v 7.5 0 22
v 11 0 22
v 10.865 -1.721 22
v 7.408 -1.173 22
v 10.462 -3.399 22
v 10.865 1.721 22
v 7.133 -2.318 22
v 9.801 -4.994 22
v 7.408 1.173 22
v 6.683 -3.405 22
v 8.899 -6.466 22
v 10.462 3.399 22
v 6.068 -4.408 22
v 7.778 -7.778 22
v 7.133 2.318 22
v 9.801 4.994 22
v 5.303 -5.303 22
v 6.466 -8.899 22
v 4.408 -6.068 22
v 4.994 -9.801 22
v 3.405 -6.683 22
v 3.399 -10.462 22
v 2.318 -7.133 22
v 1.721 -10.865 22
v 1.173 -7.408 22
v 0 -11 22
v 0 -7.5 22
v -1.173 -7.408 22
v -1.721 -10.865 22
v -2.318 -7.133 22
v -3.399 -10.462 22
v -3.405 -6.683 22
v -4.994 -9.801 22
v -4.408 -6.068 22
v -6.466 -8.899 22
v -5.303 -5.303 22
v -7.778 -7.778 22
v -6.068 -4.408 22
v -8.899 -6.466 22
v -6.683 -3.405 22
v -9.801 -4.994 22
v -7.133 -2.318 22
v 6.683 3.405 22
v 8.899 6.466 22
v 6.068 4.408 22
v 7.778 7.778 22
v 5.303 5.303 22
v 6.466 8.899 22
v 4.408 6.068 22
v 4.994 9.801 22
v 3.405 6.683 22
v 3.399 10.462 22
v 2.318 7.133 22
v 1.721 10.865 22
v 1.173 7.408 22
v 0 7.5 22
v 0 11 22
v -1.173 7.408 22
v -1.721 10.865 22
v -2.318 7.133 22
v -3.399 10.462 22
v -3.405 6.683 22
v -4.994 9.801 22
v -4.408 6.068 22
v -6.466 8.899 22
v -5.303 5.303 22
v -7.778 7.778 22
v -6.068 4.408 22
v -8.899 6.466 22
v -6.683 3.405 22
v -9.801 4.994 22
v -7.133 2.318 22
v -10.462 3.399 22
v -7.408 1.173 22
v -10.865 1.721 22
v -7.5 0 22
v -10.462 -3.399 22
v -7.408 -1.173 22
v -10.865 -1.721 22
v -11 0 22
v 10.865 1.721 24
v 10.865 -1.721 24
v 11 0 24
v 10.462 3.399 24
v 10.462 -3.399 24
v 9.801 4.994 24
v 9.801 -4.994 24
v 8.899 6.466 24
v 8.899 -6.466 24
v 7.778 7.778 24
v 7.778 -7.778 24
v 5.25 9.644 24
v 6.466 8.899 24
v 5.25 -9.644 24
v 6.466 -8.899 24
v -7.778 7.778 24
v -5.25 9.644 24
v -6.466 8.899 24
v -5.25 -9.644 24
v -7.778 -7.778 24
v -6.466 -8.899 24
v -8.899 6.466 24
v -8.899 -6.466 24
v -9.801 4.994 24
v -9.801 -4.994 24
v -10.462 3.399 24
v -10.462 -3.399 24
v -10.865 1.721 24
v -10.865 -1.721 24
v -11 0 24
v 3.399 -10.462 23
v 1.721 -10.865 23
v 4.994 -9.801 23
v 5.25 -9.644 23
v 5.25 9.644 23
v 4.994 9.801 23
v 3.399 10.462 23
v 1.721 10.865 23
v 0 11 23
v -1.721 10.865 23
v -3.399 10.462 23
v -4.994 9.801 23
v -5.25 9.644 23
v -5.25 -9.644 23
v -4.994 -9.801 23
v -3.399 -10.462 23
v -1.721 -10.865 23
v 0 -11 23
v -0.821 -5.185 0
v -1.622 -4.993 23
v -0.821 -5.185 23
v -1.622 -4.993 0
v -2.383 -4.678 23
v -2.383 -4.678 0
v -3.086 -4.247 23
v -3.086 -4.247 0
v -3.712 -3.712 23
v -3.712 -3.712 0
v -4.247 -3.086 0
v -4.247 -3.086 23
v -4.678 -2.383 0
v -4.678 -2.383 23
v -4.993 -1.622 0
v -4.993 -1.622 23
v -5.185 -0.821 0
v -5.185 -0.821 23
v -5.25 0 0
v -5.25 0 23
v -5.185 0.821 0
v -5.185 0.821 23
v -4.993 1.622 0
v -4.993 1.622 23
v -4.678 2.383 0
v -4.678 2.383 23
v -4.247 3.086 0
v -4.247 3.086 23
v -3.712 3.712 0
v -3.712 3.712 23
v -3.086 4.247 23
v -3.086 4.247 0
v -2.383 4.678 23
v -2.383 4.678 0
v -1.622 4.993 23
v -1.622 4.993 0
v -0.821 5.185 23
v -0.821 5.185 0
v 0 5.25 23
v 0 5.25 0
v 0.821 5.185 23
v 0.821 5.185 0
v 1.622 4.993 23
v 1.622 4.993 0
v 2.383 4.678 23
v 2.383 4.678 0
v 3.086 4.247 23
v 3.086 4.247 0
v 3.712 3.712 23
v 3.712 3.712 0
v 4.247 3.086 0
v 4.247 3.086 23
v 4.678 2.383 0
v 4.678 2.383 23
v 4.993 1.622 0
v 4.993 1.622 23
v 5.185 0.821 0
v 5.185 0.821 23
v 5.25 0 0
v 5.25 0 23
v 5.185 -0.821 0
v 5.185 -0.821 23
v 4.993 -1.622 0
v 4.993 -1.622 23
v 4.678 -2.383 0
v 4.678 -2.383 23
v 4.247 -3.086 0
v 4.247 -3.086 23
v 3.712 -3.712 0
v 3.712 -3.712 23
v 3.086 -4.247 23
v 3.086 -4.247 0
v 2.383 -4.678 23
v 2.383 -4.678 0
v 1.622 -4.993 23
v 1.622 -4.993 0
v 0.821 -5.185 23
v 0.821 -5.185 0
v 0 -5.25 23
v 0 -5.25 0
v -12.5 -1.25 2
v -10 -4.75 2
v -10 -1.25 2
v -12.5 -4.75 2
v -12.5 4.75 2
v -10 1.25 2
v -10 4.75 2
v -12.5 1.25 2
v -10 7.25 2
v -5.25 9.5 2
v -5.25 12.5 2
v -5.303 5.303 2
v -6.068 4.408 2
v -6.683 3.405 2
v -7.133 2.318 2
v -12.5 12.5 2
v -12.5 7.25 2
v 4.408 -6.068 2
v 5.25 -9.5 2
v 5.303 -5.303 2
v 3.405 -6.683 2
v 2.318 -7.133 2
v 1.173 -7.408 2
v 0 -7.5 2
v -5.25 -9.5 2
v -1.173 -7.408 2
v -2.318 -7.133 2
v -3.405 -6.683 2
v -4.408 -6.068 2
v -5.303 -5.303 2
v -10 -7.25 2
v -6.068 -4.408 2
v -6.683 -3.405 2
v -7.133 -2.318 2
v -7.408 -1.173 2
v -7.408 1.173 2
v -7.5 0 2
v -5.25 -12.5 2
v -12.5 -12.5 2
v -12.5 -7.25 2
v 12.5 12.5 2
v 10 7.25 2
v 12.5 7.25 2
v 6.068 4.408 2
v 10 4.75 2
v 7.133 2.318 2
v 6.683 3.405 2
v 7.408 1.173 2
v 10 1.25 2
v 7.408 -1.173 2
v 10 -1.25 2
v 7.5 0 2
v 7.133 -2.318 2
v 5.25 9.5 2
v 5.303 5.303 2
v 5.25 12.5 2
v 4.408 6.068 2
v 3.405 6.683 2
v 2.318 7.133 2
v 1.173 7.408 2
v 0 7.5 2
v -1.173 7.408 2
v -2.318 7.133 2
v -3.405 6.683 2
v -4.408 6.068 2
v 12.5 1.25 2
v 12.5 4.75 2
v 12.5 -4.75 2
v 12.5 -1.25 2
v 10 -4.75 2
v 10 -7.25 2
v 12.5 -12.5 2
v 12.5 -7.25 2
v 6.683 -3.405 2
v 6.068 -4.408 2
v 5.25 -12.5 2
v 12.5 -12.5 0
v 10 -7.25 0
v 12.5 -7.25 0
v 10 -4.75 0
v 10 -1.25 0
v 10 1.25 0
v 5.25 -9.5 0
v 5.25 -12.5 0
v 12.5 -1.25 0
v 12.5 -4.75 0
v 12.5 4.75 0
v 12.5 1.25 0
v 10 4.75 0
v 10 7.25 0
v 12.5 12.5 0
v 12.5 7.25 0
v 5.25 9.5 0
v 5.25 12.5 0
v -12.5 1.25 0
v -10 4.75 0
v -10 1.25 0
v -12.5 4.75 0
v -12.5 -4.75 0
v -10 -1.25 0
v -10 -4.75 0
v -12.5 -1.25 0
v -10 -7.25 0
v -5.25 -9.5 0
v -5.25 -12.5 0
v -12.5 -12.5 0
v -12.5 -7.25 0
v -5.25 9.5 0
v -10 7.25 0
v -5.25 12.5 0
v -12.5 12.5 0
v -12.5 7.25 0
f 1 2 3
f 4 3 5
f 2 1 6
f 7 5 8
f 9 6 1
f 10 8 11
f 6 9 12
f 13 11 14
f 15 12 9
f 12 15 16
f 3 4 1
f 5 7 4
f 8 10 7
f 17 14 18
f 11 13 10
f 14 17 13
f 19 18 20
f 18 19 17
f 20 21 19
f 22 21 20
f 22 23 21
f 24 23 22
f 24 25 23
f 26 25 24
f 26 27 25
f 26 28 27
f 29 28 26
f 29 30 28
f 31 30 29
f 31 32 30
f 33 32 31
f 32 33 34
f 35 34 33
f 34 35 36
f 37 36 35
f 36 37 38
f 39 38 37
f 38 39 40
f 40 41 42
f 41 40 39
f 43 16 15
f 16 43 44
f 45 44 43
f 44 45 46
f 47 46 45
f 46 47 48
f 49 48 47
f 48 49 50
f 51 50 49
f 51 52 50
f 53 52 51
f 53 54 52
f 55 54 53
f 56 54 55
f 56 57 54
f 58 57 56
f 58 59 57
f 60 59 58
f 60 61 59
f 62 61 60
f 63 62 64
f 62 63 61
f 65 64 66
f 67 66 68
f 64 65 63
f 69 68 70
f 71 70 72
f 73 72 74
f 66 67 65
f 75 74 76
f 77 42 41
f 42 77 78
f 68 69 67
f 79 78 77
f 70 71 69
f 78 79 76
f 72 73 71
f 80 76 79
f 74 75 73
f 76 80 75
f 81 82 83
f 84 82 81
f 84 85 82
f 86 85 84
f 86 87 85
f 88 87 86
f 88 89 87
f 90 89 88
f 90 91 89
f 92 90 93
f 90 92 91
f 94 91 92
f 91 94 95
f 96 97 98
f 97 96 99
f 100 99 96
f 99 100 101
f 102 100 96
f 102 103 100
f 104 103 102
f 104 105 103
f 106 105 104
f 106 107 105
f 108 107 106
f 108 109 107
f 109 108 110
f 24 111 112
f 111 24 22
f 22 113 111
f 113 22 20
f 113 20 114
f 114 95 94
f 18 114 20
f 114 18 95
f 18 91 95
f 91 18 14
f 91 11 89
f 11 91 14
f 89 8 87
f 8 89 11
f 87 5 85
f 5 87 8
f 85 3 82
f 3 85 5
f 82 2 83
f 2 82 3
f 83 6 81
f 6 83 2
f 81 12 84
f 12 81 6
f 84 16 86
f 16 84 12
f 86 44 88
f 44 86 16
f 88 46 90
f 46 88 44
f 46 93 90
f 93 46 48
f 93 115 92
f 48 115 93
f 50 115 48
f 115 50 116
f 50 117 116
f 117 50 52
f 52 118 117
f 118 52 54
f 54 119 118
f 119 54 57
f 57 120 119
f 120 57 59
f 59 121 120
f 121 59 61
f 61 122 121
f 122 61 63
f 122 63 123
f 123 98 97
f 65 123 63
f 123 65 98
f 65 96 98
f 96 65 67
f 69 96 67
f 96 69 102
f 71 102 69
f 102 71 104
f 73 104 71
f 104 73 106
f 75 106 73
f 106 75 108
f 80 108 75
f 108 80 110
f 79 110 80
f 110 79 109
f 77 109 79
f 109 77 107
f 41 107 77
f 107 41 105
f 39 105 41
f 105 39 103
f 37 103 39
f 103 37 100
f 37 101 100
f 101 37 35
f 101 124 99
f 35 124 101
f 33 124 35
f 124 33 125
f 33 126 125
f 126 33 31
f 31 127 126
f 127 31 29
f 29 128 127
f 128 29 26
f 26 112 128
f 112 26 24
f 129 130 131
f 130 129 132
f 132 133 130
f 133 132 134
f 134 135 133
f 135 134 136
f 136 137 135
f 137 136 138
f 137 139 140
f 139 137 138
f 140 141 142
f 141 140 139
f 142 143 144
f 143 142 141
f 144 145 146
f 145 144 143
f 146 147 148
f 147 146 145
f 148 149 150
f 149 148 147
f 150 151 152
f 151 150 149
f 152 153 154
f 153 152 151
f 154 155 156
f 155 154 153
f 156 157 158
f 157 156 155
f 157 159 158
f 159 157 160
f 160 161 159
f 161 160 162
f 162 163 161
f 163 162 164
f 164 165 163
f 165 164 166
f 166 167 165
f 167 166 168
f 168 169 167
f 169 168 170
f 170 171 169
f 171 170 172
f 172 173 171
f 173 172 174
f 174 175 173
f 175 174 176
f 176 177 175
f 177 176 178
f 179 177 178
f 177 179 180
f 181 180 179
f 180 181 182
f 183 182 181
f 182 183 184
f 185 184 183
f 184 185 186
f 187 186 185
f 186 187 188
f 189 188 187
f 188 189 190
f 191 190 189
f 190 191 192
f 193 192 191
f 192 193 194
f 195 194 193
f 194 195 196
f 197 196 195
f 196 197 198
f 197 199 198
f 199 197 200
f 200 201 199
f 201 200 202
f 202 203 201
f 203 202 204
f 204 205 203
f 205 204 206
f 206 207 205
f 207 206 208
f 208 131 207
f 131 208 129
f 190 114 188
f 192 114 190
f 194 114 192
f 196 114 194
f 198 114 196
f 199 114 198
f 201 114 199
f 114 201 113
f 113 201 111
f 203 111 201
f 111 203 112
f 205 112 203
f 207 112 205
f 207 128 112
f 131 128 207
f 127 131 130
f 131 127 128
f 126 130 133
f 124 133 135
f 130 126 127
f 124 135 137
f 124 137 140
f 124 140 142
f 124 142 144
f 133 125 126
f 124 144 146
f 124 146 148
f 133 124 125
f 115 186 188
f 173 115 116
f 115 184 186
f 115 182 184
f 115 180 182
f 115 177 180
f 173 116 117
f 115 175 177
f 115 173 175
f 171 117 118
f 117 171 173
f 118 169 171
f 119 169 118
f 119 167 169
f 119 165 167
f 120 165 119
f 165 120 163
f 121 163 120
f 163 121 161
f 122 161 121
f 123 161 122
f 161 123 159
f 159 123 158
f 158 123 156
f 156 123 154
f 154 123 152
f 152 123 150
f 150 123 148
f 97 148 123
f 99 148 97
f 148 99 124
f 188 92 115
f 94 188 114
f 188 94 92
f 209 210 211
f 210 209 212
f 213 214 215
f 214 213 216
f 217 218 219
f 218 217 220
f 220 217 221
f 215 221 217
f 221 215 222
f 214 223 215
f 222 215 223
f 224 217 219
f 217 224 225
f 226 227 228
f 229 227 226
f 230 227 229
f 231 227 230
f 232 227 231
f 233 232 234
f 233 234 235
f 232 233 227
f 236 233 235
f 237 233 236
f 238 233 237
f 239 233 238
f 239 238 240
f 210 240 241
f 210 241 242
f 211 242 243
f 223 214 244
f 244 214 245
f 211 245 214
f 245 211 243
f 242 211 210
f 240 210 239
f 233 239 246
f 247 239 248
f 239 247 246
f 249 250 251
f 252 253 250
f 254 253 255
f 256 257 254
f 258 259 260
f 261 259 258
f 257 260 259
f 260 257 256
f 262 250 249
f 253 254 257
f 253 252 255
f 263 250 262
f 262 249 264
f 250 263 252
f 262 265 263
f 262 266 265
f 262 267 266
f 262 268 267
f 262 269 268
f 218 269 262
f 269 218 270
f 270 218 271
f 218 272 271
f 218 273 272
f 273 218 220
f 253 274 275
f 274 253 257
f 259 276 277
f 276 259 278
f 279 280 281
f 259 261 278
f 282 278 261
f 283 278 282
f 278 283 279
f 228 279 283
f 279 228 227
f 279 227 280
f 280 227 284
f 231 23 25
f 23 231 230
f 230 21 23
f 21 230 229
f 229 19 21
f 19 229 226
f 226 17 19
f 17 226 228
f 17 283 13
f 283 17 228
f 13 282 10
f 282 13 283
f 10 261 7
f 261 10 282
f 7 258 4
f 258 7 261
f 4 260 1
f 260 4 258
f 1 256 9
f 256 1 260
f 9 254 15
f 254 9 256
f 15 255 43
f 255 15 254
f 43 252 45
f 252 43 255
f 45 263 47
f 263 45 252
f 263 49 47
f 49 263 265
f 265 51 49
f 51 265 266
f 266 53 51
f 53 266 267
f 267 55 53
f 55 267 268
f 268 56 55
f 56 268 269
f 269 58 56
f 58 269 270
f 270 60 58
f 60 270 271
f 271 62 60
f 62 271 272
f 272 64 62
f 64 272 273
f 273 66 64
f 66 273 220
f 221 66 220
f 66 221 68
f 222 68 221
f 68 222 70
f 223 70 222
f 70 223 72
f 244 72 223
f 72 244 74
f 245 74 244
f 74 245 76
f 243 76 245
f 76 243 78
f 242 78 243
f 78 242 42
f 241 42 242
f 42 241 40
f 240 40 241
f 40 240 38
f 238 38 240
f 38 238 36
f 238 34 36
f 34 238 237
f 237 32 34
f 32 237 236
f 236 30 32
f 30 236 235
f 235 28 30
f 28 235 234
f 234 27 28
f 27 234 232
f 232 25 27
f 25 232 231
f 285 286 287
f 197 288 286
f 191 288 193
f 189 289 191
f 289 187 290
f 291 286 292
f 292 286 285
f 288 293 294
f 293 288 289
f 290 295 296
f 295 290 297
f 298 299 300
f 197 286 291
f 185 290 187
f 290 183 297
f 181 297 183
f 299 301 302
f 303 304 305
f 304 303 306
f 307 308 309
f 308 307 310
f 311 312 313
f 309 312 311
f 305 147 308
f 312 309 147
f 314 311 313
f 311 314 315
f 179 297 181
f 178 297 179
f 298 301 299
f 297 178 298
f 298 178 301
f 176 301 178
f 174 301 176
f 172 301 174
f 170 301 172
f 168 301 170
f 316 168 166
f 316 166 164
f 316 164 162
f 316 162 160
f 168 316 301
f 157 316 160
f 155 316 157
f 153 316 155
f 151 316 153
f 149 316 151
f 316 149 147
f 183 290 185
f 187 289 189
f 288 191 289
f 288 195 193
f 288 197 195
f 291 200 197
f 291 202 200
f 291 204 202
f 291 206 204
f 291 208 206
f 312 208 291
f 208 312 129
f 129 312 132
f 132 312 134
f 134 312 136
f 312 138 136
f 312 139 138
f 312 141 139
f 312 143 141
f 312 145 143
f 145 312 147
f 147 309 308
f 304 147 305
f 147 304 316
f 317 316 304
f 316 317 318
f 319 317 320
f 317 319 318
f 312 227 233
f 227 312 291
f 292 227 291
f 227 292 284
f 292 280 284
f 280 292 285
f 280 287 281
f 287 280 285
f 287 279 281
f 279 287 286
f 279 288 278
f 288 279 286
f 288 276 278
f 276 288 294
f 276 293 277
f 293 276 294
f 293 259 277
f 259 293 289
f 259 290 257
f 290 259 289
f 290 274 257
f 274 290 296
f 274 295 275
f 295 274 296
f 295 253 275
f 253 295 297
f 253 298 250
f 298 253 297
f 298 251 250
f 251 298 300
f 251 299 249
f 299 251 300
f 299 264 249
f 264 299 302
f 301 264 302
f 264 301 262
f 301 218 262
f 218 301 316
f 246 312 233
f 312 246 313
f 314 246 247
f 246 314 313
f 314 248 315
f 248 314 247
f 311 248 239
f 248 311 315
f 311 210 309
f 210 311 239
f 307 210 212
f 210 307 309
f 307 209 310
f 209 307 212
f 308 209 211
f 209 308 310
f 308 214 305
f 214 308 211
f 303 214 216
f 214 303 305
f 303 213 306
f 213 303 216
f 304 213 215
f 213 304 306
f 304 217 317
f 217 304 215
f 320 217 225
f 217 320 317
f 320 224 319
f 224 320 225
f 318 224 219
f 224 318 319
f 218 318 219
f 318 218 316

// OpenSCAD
$fn=40;

BOTTOML=25; //bottom length
BOTTOMW=25; //bottom width
BOTTOMH=2;  //bottom height
WLENGTH=2.5;  //length of the wire pockets
WWIDTH=2.5;  //width of the wire pockets
WDISTANCE=6;  //distance between the wire pockets
FERRITEW=10.5;  //width of the ferrite core
FERRITEWALL=3; //thickness of the ferrite wall
BODYH=20; //height of the holed_cylinder module
INNERR=5.25; //radius of the ferrite middle part
OUTTERR=7.5;  //outter radius of the holed_cylinder
TOPR=11;  //outter radius of the top part

module holed_cylinder() {
  linear_extrude(BODYH) {
    difference() {
      circle(r = OUTTERR);
      circle(r = INNERR);
    }
  }
}

translate([0,0,BOTTOMH]) {
  holed_cylinder();
}

module bottom() {
  linear_extrude(BOTTOMH) {
    difference() {
      translate([BOTTOML/4,0,0]) {
        square([BOTTOML/2,BOTTOMW], center=true);
      }
      
      translate([BOTTOML/2-WLENGTH/2,WDISTANCE,0]) {
        square([WLENGTH,WWIDTH], center=true);
      }
      translate([BOTTOML/2-WLENGTH/2,0,0]) {
        square([WLENGTH,WWIDTH], center=true);
      }
      translate([BOTTOML/2-WLENGTH/2,-WDISTANCE,0]) {
        square([WLENGTH,WWIDTH], center=true);
      }
      
      translate([0,BOTTOMW/2-FERRITEWALL,0]) {
        square([FERRITEW/2,FERRITEWALL]);
      }
      translate([0,-BOTTOMW/2,0]) {
        square([FERRITEW/2,FERRITEWALL]);
      }
      circle(r = INNERR);
    }
  }
}

bottom();

mirror([1,0,0]) {
  bottom();
}

module top() {
  translate([0,0,BOTTOMH+BODYH]) {
    difference() {
      linear_extrude(2) {
        difference() {
          circle(r = TOPR);
          circle(r = INNERR);
        }
      }
      translate([0,0,1]) {
        linear_extrude(1) {
          square([FERRITEW,TOPR*2],center = true);
        }
      }
    }
  }
}

top();
